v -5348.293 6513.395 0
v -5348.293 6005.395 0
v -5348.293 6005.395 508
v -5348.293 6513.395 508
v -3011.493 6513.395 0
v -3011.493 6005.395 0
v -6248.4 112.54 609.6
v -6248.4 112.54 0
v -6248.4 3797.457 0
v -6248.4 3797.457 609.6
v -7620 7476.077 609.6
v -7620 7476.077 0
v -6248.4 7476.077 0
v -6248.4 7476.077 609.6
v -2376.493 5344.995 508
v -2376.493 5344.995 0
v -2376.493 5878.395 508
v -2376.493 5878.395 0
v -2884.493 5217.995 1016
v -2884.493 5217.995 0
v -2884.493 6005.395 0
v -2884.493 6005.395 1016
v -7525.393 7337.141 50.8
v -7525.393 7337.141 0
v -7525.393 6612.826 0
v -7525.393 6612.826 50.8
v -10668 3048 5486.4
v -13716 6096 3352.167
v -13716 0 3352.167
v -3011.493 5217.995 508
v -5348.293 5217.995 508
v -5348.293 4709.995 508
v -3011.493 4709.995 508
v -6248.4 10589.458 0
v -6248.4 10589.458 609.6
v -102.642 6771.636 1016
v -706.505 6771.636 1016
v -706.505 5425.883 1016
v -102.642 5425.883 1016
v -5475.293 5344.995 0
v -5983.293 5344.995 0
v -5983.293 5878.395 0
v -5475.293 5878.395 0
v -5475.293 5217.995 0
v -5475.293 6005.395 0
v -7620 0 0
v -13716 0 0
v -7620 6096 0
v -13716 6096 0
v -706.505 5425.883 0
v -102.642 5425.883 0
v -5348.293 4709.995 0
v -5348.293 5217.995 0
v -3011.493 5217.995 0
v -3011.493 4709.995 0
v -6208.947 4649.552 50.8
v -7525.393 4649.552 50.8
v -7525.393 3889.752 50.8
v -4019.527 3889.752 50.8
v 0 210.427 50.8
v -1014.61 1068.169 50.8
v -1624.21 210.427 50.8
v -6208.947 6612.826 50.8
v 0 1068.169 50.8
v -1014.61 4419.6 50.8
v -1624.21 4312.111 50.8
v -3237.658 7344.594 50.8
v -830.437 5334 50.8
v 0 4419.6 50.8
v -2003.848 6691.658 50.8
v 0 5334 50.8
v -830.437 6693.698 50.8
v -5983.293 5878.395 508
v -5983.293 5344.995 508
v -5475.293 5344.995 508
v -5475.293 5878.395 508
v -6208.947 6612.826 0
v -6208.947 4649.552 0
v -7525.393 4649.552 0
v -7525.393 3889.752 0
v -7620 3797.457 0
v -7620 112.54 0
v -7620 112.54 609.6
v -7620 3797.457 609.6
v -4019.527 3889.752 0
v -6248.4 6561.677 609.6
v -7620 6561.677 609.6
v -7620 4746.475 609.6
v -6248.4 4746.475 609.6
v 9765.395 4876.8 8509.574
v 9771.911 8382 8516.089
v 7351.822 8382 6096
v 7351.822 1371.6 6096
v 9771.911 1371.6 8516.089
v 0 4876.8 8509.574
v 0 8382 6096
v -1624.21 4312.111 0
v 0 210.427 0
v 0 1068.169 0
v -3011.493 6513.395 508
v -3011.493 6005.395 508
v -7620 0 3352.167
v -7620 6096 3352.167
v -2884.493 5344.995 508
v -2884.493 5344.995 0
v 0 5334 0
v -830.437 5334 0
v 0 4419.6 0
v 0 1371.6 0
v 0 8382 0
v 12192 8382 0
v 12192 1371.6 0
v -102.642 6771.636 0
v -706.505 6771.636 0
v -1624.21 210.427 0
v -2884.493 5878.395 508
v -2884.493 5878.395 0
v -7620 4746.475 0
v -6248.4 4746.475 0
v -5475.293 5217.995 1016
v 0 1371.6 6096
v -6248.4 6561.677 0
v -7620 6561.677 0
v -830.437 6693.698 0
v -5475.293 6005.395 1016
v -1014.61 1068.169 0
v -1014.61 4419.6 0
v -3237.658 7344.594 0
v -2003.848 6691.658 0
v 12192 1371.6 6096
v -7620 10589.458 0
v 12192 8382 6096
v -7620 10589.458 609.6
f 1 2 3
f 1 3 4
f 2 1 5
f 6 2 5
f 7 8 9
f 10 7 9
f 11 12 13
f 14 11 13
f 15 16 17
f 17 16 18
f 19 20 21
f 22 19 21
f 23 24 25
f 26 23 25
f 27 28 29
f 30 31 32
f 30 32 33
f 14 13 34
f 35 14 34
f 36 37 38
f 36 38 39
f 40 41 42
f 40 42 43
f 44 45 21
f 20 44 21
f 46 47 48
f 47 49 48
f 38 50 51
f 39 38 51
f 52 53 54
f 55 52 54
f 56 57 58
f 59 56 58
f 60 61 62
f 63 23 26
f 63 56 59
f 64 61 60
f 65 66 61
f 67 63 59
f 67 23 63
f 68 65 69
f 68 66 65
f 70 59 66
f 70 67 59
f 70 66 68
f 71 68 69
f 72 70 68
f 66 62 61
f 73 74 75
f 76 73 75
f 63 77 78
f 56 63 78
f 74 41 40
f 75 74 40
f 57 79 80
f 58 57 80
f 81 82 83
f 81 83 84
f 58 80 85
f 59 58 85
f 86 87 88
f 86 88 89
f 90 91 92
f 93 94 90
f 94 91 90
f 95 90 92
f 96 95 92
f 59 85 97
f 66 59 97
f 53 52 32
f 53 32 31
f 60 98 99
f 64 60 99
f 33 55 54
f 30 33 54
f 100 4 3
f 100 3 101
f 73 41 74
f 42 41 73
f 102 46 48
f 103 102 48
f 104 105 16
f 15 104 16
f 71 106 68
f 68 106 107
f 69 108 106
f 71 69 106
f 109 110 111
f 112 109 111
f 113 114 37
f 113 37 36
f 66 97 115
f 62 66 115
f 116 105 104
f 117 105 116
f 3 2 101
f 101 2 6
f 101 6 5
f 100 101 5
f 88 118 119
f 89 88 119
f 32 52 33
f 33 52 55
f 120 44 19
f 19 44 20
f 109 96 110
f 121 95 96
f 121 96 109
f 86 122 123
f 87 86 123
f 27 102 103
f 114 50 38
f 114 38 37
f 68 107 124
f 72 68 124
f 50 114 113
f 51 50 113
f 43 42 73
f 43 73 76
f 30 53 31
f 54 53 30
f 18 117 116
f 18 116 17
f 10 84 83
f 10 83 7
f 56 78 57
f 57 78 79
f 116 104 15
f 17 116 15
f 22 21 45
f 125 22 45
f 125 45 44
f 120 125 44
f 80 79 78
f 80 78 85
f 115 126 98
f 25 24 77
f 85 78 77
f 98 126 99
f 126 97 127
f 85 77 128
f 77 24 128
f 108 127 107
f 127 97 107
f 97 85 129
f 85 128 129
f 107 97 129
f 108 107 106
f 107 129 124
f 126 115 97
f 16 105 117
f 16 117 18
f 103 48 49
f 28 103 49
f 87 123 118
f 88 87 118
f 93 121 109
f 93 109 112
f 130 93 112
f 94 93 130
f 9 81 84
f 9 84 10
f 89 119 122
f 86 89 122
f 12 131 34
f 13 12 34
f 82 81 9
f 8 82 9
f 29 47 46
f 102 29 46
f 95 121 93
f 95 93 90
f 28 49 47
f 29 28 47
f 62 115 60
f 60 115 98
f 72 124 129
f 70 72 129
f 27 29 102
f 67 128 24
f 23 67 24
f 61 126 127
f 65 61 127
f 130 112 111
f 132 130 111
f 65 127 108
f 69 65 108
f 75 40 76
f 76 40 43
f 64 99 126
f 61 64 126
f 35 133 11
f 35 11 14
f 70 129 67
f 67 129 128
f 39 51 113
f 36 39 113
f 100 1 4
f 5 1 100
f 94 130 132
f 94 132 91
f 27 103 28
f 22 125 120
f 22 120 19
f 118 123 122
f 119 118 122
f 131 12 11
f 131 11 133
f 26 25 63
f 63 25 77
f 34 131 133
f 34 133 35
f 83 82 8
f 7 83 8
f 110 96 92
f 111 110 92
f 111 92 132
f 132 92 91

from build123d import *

# Parameters (mm, degrees)
F0_W      = 1371.6
F0_H      = 3684.9179491401
F1_DEPTH  = 609.6
F0_H_2    = 3113.3810096741
F2_DEPTH  = 5486.4
F3_SIZE2  = 2134.232566
F3_SIZE   = 3047.99999
F0_W_2    = 12192
F0_H_3    = 7010.4
F4_DEPTH  = 6096
F6_DEPTH  = 7010.4
F10_W     = 2336.8
F10_H     = 508
F11_DEPTH = 508
F10_W_2   = 508
F10_H_2   = 533.4
F10_W_3   = 603.8634702563
F10_H_3   = 1345.7531929016
F12_DEPTH = 1016
F14_DEPTH = 50.8


# Not quite as in the source:
# - a fillet or chamfer is up to 0.001 mm smaller than in the source, because OpenCascade refuses the exact size
# - the program builds the solid bodies; features that only make, move or delete a surface that nothing else refers to are left out


with BuildPart() as f1:
    # F0 (on Top) → F1 (new body)
    with BuildSketch(Plane.XY):
        with Locations((-6934.2, 1954.9984820187)):
            Rectangle(F0_W, F0_H)
    extrude(amount=F1_DEPTH)


with BuildPart() as f1b:
    # F0 (on Top) → F1, piece 2 (new body)
    with BuildSketch(Plane.XY):
        Polygon((-7620, 6561.6774559021), (-7620, 6096), (-7620, 4746.4752197266), (-6248.4, 4746.4752197266), (-6248.4, 6561.6774559021), align=None)
    extrude(amount=F1_DEPTH)


with BuildPart() as f1c:
    # F0 (on Top) → F1, piece 3 (new body)
    with BuildSketch(Plane.XY):
        with Locations((-6934.2, 9032.7679607391)):
            Rectangle(F0_W, F0_H_2)
    extrude(amount=F1_DEPTH)


with BuildPart() as f2:
    # F0 (on Top) → F2 (new body)
    with BuildSketch(Plane.XY):
        Polygon((-13716, 0), (-7620, 0), (-7620, 112.5395074487), (-7620, 3797.4574565887), (-7620, 4746.4752197266), (-7620, 6096), (-13716, 6096), align=None)
    extrude(amount=F2_DEPTH)

    # F3 (size 3048 and 2134.2325764632 in the source; OpenCascade refuses exactly that, so slightly less here)
    f3_edges = [f2.edges().sort_by_distance(p)[0] for p in [
        (-10668, 0, 5486.4),
        (-7620, 3048, 5486.4),
        (-10668, 6096, 5486.4),
        (-13716, 3048, 5486.4),
    ]]
    f3_side = f2.faces().sort_by_distance((-10668, 3048, 5486.4))[0]
    chamfer(f3_edges, length=F3_SIZE, length2=F3_SIZE2, reference=f3_side)


with BuildPart() as f4:
    # F0 (on Top) → F4 (new body)
    with BuildSketch(Plane.XY):
        with Locations((6096, 4876.8)):
            Rectangle(F0_W_2, F0_H_3)
    extrude(amount=F4_DEPTH)

    # F5 (on face) → F6 (join, through all)
    with BuildSketch(Plane.XZ.offset(-1371.6)):
        Polygon((7351.821556229, 6096), (12192, 6096), (9771.9107781145, 8516.0892218855), align=None)
    extrude(amount=-F6_DEPTH)

    # F7 (on face) → F8 (join, up to the next surface of F4)
    with BuildSketch(Plane(origin=(0, 0, 0), x_dir=(0, -1, 0), z_dir=(-1, 0, 0))):
        Polygon((-4876.8, 8509.5739364624), (-8382, 6096), (-1371.6, 6096), align=None)
    extrude(until=Until.NEXT, dir=(1, 0, 0))


with BuildPart() as f11:
    # F10 (on Top) → F11 (new body)
    with BuildSketch(Plane.XY):
        with Locations((-4179.8933044434, 6259.3952697754)):
            Rectangle(F10_W, F10_H)
    extrude(amount=F11_DEPTH)


with BuildPart() as f11b:
    # F10 (on Top) → F11, piece 2 (new body)
    with BuildSketch(Plane.XY):
        with Locations((-5729.2933044434, 5611.6952697754)):
            Rectangle(F10_W_2, F10_H_2)
    extrude(amount=F11_DEPTH)


with BuildPart() as f11c:
    # F10 (on Top) → F11, piece 3 (new body)
    with BuildSketch(Plane.XY):
        with Locations((-4179.8933044434, 4963.9952697754)):
            Rectangle(F10_W, F10_H)
    extrude(amount=F11_DEPTH)


with BuildPart() as f11d:
    # F10 (on Top) → F11, piece 4 (new body)
    with BuildSketch(Plane.XY):
        with Locations((-2630.4933044434, 5611.6952697754)):
            Rectangle(F10_W_2, F10_H_2)
    extrude(amount=F11_DEPTH)


with BuildPart() as f12:
    # F10 (on Top) → F12 (new body)
    with BuildSketch(Plane.XY):
        with Locations((-404.5735634863, 6098.7594127655)):
            Rectangle(F10_W_3, F10_H_3)
    extrude(amount=F12_DEPTH)


with BuildPart() as f12b:
    # F10 (on Top) → F12, piece 2 (new body)
    with BuildSketch(Plane.XY):
        Polygon((-5348.2933044434, 6005.3952697754), (-5475.2933044434, 6005.3952697754), (-5475.2933044434, 5878.3952697754), (-5475.2933044434, 5344.9952697754), (-5475.2933044434, 5217.9952697754), (-5348.2933044434, 5217.9952697754), (-3011.4933044434, 5217.9952697754), (-2884.4933044434, 5217.9952697754), (-2884.4933044434, 5344.9952697754), (-2884.4933044434, 5878.3952697754), (-2884.4933044434, 6005.3952697754), (-3011.4933044434, 6005.3952697754), align=None)
    extrude(amount=F12_DEPTH)


with BuildPart() as f14:
    # F13 (on Top) → F14 (new body)
    with BuildSketch(Plane.XY):
        Polygon((0, 4419.6), (0, 5334), (-830.4370045662, 5334), (-830.4370045662, 6693.6980781448), (-2003.8484761488, 6691.6584623371), (-3237.6575581537, 7344.5940092938), (-7525.3930091858, 7337.1410968098), (-7525.3930091858, 6612.8264071736), (-6208.9473012541, 6612.8264071736), (-6208.9473012541, 4649.5519282613), (-7525.3930091858, 4649.5519282613), (-7525.3930091858, 3889.7521495819), (-4019.5266004871, 3889.7521495819), (-1624.2101192474, 4312.1110725601), (-1624.2101192474, 3889.7521495819), (-1624.2101192474, 210.4274940615), (0, 210.4274940615), (0, 1068.1687307482), (-1014.6101192474, 1068.1687307482), (-1014.6101192474, 4419.6), align=None)
    extrude(amount=F14_DEPTH)


solid = Compound([f1.part, f1b.part, f1c.part, f2.part, f4.part, f11.part, f11b.part, f11c.part, f11d.part, f12.part, f12b.part, f14.part])
